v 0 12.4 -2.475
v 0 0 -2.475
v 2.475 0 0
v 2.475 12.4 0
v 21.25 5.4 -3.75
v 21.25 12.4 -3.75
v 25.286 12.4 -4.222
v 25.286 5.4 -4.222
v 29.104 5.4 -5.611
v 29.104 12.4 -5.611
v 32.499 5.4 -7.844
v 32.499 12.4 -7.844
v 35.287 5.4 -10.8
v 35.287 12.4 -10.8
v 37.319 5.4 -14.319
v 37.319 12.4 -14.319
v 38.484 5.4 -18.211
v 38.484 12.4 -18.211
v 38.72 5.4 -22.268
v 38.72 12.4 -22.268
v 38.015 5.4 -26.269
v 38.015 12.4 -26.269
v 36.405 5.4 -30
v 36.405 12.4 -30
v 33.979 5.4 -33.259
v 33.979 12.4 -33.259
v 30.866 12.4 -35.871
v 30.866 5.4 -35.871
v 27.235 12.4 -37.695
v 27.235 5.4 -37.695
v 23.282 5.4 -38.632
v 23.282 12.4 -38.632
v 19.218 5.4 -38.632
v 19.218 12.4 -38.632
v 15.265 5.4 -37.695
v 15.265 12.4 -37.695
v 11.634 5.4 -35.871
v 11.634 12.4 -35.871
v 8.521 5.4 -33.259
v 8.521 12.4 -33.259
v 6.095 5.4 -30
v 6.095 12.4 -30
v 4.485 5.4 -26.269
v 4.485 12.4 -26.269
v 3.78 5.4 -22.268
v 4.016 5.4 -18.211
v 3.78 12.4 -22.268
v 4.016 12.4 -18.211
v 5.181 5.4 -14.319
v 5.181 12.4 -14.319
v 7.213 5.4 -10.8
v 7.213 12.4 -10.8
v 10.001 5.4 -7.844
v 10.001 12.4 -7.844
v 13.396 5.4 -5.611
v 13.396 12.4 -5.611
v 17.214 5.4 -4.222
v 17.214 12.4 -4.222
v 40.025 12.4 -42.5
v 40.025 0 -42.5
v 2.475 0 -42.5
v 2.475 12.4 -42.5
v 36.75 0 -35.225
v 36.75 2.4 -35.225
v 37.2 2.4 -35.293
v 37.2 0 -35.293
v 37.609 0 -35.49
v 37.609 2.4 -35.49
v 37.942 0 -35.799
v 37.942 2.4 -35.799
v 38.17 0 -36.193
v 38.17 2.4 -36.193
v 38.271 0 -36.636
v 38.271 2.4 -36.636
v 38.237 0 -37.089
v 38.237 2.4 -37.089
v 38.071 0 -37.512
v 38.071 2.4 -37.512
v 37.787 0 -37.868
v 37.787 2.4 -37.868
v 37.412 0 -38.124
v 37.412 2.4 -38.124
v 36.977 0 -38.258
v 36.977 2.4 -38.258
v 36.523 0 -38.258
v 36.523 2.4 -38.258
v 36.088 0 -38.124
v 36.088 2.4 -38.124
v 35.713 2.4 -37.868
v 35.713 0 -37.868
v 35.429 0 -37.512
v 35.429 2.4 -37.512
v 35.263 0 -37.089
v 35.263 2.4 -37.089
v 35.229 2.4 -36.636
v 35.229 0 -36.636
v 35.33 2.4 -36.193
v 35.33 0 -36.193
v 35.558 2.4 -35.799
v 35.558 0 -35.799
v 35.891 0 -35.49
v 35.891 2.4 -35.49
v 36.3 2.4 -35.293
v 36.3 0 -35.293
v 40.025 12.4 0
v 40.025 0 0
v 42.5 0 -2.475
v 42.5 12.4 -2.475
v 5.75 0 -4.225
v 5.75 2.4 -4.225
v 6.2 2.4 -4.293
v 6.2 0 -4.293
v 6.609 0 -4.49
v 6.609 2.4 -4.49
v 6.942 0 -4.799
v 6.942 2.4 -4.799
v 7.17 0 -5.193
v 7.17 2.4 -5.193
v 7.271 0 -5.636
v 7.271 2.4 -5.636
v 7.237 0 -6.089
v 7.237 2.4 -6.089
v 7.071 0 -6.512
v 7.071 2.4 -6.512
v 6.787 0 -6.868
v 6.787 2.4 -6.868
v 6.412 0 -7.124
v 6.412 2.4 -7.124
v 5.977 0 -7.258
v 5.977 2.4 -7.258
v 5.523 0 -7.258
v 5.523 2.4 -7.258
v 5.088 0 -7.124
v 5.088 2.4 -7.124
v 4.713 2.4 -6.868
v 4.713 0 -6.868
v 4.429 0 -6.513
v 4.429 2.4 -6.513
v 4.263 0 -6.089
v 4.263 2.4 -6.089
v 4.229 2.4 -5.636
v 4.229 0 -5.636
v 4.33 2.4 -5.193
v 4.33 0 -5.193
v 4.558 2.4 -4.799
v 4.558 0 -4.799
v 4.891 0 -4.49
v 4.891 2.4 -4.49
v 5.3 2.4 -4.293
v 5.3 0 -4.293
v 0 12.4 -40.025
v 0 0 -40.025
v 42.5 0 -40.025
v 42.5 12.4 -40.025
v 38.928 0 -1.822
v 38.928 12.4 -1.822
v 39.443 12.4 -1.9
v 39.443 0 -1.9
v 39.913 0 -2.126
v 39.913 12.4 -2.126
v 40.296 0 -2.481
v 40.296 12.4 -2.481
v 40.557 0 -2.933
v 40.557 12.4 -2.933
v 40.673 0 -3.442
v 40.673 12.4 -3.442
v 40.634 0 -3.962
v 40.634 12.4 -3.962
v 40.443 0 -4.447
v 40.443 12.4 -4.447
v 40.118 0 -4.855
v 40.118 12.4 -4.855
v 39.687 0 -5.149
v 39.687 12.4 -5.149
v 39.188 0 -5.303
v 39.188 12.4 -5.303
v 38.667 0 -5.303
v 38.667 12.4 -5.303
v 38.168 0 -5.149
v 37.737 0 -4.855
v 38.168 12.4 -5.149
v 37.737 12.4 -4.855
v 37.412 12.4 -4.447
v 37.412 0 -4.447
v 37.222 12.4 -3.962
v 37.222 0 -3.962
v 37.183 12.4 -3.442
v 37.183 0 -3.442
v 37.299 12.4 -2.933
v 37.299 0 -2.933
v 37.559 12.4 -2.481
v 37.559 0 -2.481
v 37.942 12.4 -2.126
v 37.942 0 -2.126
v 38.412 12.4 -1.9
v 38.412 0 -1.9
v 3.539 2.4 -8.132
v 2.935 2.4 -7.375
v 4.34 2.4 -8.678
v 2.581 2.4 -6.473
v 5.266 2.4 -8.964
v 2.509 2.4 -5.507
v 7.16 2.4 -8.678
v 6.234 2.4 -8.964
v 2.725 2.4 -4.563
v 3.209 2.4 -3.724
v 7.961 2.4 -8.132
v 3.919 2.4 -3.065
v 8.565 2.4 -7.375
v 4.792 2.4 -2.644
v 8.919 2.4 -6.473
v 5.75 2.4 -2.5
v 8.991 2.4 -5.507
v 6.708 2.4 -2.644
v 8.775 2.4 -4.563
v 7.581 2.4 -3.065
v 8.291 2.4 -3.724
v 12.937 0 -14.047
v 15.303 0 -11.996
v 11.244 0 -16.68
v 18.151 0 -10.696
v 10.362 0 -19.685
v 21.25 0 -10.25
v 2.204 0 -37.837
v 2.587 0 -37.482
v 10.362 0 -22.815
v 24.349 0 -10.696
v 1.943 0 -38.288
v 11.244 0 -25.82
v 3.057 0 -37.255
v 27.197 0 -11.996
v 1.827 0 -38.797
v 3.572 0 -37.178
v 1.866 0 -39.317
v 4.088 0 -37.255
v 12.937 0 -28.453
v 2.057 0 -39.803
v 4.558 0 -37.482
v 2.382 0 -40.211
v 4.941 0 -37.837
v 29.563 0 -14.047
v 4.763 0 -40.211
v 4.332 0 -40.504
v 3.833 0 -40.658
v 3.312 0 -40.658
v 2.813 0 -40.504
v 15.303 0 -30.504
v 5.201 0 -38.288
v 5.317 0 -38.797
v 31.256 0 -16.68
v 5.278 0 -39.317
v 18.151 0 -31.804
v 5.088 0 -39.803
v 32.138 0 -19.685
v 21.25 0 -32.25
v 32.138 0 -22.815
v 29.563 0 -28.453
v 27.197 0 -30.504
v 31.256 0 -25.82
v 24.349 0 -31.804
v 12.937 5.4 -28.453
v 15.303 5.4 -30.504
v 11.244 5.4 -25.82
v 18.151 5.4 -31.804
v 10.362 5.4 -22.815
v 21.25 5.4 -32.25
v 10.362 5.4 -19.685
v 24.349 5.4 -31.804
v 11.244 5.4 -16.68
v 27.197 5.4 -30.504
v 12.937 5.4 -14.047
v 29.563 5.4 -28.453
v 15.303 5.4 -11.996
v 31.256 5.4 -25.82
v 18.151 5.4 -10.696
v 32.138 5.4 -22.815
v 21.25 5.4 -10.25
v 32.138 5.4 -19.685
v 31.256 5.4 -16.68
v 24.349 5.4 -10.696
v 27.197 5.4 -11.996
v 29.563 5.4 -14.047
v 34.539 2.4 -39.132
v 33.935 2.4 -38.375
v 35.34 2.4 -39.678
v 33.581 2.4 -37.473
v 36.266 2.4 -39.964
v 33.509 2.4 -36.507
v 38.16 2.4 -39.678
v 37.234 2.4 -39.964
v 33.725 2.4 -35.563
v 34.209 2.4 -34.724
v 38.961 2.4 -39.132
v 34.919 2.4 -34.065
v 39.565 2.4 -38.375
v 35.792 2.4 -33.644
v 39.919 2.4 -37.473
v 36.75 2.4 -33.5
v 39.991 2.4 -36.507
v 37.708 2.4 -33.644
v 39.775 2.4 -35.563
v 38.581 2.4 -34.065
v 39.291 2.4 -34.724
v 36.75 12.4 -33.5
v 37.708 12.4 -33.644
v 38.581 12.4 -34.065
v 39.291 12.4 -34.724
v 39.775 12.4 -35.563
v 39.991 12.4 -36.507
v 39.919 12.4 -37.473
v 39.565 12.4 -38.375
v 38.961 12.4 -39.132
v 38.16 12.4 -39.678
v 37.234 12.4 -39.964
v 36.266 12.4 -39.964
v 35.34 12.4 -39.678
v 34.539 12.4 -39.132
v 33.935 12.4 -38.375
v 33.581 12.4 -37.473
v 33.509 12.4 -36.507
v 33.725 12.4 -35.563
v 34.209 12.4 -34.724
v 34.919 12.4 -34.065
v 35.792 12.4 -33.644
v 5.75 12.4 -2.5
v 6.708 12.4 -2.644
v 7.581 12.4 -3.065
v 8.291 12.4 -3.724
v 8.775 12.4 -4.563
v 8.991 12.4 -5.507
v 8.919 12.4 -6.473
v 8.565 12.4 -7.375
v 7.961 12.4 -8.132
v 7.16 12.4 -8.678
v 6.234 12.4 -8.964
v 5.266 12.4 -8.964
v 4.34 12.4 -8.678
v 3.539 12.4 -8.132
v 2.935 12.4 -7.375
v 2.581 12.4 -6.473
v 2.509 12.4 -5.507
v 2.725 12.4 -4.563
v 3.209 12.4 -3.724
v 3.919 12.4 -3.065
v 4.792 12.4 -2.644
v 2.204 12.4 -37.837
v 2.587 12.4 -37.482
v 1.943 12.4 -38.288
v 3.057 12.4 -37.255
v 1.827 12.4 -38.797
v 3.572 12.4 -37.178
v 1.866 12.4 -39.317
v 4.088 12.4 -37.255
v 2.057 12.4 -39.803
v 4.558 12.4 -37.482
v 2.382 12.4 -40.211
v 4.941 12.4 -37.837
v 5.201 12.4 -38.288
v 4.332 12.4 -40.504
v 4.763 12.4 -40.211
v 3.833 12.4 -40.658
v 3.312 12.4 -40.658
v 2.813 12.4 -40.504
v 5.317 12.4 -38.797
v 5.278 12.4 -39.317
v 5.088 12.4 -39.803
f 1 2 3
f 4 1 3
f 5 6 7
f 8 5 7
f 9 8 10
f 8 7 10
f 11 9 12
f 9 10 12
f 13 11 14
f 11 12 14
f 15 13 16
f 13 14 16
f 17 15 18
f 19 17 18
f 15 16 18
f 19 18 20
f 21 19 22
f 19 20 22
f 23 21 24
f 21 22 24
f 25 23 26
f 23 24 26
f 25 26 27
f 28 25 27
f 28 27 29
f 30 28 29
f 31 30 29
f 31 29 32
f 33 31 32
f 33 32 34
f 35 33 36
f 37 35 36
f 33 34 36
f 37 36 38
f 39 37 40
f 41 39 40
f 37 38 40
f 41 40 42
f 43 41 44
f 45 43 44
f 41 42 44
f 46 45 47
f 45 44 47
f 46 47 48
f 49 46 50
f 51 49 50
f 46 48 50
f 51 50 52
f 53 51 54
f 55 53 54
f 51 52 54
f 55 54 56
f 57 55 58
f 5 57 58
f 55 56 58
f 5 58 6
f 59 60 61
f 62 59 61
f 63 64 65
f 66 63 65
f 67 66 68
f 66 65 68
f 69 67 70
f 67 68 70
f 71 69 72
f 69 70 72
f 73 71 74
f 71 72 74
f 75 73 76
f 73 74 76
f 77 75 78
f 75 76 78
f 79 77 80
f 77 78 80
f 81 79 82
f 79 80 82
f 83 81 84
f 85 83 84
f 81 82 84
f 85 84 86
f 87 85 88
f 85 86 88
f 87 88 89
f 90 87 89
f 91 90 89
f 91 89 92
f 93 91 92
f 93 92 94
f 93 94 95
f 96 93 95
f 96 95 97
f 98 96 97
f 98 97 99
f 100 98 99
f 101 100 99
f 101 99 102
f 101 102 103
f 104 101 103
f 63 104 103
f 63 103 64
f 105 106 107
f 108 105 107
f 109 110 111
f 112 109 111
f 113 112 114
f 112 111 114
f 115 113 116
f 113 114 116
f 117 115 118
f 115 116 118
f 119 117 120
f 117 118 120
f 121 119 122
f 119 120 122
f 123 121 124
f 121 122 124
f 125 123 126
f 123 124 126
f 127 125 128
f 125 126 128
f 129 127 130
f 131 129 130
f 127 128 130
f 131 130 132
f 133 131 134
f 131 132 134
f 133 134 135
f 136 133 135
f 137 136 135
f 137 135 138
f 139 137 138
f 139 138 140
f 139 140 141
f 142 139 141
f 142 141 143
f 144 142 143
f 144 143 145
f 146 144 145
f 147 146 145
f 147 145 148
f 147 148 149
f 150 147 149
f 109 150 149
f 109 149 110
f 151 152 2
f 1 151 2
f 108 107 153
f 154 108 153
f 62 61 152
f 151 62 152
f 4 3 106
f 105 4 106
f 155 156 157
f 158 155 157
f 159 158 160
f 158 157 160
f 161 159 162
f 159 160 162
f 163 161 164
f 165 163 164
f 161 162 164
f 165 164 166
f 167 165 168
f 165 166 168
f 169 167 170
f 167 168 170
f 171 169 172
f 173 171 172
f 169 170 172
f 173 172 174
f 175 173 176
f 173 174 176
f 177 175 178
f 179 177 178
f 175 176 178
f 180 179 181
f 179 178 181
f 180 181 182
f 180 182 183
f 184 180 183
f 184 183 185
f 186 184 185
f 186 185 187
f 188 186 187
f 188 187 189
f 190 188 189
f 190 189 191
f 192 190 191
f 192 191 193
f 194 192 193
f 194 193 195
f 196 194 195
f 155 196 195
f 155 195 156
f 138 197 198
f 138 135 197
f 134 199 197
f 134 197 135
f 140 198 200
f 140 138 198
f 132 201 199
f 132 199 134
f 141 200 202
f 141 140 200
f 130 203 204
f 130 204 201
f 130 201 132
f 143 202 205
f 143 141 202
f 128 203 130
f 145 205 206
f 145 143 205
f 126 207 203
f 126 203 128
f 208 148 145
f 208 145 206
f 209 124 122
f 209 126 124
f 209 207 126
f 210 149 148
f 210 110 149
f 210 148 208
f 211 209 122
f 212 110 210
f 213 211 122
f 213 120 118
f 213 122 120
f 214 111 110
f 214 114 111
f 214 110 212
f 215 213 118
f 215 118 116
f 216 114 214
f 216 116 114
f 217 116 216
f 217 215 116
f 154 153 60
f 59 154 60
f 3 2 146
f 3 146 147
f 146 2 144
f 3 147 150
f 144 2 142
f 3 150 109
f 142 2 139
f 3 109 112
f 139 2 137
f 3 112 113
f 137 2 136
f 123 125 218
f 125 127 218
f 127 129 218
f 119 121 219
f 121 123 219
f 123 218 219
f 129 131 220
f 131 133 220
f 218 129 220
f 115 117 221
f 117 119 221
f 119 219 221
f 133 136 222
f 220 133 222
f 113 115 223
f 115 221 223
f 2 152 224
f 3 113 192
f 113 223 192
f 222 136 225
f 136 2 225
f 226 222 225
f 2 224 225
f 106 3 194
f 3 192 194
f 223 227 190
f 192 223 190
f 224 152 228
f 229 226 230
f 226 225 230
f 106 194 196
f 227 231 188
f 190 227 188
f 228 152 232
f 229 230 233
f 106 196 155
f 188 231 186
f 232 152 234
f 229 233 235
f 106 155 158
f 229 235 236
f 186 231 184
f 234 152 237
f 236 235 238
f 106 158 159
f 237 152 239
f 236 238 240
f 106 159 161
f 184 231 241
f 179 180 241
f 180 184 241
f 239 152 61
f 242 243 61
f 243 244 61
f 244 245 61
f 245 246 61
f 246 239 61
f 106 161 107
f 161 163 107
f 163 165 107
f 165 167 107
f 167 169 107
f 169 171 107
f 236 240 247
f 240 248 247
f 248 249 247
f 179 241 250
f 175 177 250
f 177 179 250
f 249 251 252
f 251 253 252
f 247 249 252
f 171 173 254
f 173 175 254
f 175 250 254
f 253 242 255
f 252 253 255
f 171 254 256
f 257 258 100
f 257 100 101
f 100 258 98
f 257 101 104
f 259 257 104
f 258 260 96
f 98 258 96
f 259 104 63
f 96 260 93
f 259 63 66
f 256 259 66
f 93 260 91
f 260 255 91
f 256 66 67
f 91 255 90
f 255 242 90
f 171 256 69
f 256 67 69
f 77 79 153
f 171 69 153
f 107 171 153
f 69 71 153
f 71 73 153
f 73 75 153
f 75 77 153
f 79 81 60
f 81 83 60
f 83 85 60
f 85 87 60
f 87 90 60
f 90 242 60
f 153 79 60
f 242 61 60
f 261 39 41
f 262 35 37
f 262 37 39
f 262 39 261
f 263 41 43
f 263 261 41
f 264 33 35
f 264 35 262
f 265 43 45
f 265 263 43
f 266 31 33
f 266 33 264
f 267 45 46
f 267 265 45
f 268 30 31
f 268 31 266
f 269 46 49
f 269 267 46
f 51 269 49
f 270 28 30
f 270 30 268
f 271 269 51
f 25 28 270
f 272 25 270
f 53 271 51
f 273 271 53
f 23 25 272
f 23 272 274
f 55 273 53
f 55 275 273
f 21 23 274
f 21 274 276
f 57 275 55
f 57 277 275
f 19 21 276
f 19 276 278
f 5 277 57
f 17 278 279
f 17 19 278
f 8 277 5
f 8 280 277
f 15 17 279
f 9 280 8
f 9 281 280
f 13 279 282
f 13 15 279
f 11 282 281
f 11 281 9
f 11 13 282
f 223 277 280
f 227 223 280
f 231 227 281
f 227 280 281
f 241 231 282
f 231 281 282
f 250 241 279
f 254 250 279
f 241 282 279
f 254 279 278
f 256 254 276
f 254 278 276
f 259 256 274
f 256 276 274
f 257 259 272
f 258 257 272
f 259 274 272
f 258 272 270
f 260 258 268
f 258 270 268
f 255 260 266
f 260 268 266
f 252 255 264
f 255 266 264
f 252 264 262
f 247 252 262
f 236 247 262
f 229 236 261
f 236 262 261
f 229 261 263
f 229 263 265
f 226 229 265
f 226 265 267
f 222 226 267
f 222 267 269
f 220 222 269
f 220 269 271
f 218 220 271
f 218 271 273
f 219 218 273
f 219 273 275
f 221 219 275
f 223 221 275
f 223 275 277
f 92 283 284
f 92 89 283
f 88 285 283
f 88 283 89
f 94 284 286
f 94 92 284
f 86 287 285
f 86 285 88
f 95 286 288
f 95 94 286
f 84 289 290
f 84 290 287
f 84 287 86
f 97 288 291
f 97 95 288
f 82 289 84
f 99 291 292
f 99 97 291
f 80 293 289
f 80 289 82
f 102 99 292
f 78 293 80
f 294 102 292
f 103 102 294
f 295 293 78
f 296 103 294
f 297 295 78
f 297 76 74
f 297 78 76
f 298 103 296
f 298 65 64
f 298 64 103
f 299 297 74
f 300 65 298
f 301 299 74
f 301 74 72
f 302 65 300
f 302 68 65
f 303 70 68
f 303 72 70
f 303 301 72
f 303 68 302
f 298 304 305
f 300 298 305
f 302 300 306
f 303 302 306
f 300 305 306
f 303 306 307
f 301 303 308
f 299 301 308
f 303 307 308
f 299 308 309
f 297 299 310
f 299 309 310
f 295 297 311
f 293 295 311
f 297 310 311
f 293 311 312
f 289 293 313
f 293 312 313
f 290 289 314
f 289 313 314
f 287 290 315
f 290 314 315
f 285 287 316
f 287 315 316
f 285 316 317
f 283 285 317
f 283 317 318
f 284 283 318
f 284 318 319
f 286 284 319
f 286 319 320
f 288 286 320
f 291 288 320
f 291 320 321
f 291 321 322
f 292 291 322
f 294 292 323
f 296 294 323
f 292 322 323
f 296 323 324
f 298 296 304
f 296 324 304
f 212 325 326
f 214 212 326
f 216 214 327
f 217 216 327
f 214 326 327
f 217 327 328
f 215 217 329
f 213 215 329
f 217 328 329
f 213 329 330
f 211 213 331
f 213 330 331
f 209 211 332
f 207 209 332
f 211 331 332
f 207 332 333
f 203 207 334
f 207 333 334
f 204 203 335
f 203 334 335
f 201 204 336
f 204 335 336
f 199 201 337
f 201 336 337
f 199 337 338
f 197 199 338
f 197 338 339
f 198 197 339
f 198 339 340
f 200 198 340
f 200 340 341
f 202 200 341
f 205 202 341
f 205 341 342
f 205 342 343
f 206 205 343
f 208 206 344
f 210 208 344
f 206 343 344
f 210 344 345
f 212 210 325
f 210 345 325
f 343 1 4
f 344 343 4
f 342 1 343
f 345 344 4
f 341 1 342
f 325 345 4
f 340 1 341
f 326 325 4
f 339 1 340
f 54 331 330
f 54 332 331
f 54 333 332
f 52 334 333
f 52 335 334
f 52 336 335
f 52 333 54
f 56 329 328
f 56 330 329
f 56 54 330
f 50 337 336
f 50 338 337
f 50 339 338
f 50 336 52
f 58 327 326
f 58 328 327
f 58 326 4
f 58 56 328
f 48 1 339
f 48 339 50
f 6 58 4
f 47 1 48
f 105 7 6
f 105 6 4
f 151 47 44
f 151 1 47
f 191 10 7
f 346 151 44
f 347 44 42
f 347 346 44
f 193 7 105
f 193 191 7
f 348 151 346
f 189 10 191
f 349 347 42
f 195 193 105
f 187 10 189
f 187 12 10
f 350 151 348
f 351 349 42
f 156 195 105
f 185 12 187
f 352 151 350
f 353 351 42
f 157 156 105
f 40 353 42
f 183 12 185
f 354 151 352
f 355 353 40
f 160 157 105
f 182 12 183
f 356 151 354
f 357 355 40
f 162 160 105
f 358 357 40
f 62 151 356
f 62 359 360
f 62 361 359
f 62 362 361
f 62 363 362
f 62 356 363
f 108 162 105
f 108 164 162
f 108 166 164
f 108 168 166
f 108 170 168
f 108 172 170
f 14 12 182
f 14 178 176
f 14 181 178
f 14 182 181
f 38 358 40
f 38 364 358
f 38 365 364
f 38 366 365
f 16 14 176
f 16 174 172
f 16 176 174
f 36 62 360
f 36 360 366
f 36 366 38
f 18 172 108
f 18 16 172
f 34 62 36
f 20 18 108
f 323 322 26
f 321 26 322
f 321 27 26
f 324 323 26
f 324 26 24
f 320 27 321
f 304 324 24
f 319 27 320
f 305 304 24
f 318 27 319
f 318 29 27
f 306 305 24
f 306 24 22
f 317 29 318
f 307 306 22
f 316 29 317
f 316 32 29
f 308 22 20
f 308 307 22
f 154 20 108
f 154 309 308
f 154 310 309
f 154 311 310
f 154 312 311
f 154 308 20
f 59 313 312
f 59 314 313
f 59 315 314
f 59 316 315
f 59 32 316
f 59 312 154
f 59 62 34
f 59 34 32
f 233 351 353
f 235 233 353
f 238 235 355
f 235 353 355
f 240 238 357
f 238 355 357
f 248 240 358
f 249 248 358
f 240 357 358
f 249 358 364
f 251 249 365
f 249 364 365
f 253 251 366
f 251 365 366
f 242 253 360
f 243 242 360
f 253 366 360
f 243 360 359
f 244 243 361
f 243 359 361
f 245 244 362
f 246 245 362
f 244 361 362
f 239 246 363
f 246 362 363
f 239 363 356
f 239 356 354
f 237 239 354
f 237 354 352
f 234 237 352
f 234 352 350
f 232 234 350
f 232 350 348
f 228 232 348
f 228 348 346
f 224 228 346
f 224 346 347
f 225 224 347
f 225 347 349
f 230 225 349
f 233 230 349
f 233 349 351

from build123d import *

# Parameters (mm, degrees)
EXTRUDE_1_DEPTH     = 12.4
SKETCH_2_R          = 17.5
CUT_EXTRUDE_1_DEPTH = 7
SKETCH_3_R          = 11
CUT_EXTRUDE_2_DEPTH = 61.510329697
SKETCH_4_R          = 3.25
CUT_EXTRUDE_3_DEPTH = 10
SKETCH_4_3_R        = 1.75
SKETCH_4_3_R_2      = 1.525
CUT_EXTRUDE_4_DEPTH = 62.36986231


with BuildPart() as part:
    # 草图1 → 凸台-拉伸1 (new body)
    with BuildSketch(Plane(origin=(0, 0, 0), x_dir=(1, 0, 0), z_dir=(0, 1, 0))):
        Polygon((0, 40.025126266), (0, 2.474873734), (2.474873734, 0), (40.025126266, 0), (42.5, 2.474873734), (42.5, 40.025126266), (40.025126266, 42.5), (2.474873734, 42.5), align=None)
    extrude(amount=EXTRUDE_1_DEPTH)

    # 草图2 → 切除-拉伸1 (cut)
    with BuildSketch(Plane(origin=(0, 12.4, 0), x_dir=(1, 0, 0), z_dir=(0, 1, 0))):
        with Locations((21.25, 21.25)):
            Circle(SKETCH_2_R)
    extrude(amount=-CUT_EXTRUDE_1_DEPTH, mode=Mode.SUBTRACT)

    # 草图3 → 切除-拉伸2 (cut, through all)
    with BuildSketch(Plane(origin=(0, 5.4, 0), x_dir=(1, 0, 0), z_dir=(0, 1, 0))):
        with Locations((21.25, 21.25)):
            Circle(SKETCH_3_R)
    extrude(amount=-CUT_EXTRUDE_2_DEPTH, mode=Mode.SUBTRACT)

    # 草图4 → 切除-拉伸3 (cut)
    with BuildSketch(Plane(origin=(0, 12.4, 0), x_dir=(1, 0, 0), z_dir=(0, 1, 0))):
        with Locations((36.75, 36.75)):
            Circle(SKETCH_4_R)
        with Locations((5.75, 5.75)):
            Circle(SKETCH_4_R)
    extrude(amount=-CUT_EXTRUDE_3_DEPTH, mode=Mode.SUBTRACT)

    # 草图4<3> → 切除-拉伸4 (cut, through all)
    with BuildSketch(Plane(origin=(0, 12.4, 0), x_dir=(1, 0, 0), z_dir=(0, 1, 0))):
        with Locations((3.57233047, 38.92766953)):
            Circle(SKETCH_4_3_R)
        with Locations((38.92766953, 3.57233047)):
            Circle(SKETCH_4_3_R)
        with Locations((5.75, 5.75)):
            Circle(SKETCH_4_3_R_2)
        with Locations((36.75, 36.75)):
            Circle(SKETCH_4_3_R_2)
    extrude(amount=-CUT_EXTRUDE_4_DEPTH, mode=Mode.SUBTRACT)


solid = part.part
